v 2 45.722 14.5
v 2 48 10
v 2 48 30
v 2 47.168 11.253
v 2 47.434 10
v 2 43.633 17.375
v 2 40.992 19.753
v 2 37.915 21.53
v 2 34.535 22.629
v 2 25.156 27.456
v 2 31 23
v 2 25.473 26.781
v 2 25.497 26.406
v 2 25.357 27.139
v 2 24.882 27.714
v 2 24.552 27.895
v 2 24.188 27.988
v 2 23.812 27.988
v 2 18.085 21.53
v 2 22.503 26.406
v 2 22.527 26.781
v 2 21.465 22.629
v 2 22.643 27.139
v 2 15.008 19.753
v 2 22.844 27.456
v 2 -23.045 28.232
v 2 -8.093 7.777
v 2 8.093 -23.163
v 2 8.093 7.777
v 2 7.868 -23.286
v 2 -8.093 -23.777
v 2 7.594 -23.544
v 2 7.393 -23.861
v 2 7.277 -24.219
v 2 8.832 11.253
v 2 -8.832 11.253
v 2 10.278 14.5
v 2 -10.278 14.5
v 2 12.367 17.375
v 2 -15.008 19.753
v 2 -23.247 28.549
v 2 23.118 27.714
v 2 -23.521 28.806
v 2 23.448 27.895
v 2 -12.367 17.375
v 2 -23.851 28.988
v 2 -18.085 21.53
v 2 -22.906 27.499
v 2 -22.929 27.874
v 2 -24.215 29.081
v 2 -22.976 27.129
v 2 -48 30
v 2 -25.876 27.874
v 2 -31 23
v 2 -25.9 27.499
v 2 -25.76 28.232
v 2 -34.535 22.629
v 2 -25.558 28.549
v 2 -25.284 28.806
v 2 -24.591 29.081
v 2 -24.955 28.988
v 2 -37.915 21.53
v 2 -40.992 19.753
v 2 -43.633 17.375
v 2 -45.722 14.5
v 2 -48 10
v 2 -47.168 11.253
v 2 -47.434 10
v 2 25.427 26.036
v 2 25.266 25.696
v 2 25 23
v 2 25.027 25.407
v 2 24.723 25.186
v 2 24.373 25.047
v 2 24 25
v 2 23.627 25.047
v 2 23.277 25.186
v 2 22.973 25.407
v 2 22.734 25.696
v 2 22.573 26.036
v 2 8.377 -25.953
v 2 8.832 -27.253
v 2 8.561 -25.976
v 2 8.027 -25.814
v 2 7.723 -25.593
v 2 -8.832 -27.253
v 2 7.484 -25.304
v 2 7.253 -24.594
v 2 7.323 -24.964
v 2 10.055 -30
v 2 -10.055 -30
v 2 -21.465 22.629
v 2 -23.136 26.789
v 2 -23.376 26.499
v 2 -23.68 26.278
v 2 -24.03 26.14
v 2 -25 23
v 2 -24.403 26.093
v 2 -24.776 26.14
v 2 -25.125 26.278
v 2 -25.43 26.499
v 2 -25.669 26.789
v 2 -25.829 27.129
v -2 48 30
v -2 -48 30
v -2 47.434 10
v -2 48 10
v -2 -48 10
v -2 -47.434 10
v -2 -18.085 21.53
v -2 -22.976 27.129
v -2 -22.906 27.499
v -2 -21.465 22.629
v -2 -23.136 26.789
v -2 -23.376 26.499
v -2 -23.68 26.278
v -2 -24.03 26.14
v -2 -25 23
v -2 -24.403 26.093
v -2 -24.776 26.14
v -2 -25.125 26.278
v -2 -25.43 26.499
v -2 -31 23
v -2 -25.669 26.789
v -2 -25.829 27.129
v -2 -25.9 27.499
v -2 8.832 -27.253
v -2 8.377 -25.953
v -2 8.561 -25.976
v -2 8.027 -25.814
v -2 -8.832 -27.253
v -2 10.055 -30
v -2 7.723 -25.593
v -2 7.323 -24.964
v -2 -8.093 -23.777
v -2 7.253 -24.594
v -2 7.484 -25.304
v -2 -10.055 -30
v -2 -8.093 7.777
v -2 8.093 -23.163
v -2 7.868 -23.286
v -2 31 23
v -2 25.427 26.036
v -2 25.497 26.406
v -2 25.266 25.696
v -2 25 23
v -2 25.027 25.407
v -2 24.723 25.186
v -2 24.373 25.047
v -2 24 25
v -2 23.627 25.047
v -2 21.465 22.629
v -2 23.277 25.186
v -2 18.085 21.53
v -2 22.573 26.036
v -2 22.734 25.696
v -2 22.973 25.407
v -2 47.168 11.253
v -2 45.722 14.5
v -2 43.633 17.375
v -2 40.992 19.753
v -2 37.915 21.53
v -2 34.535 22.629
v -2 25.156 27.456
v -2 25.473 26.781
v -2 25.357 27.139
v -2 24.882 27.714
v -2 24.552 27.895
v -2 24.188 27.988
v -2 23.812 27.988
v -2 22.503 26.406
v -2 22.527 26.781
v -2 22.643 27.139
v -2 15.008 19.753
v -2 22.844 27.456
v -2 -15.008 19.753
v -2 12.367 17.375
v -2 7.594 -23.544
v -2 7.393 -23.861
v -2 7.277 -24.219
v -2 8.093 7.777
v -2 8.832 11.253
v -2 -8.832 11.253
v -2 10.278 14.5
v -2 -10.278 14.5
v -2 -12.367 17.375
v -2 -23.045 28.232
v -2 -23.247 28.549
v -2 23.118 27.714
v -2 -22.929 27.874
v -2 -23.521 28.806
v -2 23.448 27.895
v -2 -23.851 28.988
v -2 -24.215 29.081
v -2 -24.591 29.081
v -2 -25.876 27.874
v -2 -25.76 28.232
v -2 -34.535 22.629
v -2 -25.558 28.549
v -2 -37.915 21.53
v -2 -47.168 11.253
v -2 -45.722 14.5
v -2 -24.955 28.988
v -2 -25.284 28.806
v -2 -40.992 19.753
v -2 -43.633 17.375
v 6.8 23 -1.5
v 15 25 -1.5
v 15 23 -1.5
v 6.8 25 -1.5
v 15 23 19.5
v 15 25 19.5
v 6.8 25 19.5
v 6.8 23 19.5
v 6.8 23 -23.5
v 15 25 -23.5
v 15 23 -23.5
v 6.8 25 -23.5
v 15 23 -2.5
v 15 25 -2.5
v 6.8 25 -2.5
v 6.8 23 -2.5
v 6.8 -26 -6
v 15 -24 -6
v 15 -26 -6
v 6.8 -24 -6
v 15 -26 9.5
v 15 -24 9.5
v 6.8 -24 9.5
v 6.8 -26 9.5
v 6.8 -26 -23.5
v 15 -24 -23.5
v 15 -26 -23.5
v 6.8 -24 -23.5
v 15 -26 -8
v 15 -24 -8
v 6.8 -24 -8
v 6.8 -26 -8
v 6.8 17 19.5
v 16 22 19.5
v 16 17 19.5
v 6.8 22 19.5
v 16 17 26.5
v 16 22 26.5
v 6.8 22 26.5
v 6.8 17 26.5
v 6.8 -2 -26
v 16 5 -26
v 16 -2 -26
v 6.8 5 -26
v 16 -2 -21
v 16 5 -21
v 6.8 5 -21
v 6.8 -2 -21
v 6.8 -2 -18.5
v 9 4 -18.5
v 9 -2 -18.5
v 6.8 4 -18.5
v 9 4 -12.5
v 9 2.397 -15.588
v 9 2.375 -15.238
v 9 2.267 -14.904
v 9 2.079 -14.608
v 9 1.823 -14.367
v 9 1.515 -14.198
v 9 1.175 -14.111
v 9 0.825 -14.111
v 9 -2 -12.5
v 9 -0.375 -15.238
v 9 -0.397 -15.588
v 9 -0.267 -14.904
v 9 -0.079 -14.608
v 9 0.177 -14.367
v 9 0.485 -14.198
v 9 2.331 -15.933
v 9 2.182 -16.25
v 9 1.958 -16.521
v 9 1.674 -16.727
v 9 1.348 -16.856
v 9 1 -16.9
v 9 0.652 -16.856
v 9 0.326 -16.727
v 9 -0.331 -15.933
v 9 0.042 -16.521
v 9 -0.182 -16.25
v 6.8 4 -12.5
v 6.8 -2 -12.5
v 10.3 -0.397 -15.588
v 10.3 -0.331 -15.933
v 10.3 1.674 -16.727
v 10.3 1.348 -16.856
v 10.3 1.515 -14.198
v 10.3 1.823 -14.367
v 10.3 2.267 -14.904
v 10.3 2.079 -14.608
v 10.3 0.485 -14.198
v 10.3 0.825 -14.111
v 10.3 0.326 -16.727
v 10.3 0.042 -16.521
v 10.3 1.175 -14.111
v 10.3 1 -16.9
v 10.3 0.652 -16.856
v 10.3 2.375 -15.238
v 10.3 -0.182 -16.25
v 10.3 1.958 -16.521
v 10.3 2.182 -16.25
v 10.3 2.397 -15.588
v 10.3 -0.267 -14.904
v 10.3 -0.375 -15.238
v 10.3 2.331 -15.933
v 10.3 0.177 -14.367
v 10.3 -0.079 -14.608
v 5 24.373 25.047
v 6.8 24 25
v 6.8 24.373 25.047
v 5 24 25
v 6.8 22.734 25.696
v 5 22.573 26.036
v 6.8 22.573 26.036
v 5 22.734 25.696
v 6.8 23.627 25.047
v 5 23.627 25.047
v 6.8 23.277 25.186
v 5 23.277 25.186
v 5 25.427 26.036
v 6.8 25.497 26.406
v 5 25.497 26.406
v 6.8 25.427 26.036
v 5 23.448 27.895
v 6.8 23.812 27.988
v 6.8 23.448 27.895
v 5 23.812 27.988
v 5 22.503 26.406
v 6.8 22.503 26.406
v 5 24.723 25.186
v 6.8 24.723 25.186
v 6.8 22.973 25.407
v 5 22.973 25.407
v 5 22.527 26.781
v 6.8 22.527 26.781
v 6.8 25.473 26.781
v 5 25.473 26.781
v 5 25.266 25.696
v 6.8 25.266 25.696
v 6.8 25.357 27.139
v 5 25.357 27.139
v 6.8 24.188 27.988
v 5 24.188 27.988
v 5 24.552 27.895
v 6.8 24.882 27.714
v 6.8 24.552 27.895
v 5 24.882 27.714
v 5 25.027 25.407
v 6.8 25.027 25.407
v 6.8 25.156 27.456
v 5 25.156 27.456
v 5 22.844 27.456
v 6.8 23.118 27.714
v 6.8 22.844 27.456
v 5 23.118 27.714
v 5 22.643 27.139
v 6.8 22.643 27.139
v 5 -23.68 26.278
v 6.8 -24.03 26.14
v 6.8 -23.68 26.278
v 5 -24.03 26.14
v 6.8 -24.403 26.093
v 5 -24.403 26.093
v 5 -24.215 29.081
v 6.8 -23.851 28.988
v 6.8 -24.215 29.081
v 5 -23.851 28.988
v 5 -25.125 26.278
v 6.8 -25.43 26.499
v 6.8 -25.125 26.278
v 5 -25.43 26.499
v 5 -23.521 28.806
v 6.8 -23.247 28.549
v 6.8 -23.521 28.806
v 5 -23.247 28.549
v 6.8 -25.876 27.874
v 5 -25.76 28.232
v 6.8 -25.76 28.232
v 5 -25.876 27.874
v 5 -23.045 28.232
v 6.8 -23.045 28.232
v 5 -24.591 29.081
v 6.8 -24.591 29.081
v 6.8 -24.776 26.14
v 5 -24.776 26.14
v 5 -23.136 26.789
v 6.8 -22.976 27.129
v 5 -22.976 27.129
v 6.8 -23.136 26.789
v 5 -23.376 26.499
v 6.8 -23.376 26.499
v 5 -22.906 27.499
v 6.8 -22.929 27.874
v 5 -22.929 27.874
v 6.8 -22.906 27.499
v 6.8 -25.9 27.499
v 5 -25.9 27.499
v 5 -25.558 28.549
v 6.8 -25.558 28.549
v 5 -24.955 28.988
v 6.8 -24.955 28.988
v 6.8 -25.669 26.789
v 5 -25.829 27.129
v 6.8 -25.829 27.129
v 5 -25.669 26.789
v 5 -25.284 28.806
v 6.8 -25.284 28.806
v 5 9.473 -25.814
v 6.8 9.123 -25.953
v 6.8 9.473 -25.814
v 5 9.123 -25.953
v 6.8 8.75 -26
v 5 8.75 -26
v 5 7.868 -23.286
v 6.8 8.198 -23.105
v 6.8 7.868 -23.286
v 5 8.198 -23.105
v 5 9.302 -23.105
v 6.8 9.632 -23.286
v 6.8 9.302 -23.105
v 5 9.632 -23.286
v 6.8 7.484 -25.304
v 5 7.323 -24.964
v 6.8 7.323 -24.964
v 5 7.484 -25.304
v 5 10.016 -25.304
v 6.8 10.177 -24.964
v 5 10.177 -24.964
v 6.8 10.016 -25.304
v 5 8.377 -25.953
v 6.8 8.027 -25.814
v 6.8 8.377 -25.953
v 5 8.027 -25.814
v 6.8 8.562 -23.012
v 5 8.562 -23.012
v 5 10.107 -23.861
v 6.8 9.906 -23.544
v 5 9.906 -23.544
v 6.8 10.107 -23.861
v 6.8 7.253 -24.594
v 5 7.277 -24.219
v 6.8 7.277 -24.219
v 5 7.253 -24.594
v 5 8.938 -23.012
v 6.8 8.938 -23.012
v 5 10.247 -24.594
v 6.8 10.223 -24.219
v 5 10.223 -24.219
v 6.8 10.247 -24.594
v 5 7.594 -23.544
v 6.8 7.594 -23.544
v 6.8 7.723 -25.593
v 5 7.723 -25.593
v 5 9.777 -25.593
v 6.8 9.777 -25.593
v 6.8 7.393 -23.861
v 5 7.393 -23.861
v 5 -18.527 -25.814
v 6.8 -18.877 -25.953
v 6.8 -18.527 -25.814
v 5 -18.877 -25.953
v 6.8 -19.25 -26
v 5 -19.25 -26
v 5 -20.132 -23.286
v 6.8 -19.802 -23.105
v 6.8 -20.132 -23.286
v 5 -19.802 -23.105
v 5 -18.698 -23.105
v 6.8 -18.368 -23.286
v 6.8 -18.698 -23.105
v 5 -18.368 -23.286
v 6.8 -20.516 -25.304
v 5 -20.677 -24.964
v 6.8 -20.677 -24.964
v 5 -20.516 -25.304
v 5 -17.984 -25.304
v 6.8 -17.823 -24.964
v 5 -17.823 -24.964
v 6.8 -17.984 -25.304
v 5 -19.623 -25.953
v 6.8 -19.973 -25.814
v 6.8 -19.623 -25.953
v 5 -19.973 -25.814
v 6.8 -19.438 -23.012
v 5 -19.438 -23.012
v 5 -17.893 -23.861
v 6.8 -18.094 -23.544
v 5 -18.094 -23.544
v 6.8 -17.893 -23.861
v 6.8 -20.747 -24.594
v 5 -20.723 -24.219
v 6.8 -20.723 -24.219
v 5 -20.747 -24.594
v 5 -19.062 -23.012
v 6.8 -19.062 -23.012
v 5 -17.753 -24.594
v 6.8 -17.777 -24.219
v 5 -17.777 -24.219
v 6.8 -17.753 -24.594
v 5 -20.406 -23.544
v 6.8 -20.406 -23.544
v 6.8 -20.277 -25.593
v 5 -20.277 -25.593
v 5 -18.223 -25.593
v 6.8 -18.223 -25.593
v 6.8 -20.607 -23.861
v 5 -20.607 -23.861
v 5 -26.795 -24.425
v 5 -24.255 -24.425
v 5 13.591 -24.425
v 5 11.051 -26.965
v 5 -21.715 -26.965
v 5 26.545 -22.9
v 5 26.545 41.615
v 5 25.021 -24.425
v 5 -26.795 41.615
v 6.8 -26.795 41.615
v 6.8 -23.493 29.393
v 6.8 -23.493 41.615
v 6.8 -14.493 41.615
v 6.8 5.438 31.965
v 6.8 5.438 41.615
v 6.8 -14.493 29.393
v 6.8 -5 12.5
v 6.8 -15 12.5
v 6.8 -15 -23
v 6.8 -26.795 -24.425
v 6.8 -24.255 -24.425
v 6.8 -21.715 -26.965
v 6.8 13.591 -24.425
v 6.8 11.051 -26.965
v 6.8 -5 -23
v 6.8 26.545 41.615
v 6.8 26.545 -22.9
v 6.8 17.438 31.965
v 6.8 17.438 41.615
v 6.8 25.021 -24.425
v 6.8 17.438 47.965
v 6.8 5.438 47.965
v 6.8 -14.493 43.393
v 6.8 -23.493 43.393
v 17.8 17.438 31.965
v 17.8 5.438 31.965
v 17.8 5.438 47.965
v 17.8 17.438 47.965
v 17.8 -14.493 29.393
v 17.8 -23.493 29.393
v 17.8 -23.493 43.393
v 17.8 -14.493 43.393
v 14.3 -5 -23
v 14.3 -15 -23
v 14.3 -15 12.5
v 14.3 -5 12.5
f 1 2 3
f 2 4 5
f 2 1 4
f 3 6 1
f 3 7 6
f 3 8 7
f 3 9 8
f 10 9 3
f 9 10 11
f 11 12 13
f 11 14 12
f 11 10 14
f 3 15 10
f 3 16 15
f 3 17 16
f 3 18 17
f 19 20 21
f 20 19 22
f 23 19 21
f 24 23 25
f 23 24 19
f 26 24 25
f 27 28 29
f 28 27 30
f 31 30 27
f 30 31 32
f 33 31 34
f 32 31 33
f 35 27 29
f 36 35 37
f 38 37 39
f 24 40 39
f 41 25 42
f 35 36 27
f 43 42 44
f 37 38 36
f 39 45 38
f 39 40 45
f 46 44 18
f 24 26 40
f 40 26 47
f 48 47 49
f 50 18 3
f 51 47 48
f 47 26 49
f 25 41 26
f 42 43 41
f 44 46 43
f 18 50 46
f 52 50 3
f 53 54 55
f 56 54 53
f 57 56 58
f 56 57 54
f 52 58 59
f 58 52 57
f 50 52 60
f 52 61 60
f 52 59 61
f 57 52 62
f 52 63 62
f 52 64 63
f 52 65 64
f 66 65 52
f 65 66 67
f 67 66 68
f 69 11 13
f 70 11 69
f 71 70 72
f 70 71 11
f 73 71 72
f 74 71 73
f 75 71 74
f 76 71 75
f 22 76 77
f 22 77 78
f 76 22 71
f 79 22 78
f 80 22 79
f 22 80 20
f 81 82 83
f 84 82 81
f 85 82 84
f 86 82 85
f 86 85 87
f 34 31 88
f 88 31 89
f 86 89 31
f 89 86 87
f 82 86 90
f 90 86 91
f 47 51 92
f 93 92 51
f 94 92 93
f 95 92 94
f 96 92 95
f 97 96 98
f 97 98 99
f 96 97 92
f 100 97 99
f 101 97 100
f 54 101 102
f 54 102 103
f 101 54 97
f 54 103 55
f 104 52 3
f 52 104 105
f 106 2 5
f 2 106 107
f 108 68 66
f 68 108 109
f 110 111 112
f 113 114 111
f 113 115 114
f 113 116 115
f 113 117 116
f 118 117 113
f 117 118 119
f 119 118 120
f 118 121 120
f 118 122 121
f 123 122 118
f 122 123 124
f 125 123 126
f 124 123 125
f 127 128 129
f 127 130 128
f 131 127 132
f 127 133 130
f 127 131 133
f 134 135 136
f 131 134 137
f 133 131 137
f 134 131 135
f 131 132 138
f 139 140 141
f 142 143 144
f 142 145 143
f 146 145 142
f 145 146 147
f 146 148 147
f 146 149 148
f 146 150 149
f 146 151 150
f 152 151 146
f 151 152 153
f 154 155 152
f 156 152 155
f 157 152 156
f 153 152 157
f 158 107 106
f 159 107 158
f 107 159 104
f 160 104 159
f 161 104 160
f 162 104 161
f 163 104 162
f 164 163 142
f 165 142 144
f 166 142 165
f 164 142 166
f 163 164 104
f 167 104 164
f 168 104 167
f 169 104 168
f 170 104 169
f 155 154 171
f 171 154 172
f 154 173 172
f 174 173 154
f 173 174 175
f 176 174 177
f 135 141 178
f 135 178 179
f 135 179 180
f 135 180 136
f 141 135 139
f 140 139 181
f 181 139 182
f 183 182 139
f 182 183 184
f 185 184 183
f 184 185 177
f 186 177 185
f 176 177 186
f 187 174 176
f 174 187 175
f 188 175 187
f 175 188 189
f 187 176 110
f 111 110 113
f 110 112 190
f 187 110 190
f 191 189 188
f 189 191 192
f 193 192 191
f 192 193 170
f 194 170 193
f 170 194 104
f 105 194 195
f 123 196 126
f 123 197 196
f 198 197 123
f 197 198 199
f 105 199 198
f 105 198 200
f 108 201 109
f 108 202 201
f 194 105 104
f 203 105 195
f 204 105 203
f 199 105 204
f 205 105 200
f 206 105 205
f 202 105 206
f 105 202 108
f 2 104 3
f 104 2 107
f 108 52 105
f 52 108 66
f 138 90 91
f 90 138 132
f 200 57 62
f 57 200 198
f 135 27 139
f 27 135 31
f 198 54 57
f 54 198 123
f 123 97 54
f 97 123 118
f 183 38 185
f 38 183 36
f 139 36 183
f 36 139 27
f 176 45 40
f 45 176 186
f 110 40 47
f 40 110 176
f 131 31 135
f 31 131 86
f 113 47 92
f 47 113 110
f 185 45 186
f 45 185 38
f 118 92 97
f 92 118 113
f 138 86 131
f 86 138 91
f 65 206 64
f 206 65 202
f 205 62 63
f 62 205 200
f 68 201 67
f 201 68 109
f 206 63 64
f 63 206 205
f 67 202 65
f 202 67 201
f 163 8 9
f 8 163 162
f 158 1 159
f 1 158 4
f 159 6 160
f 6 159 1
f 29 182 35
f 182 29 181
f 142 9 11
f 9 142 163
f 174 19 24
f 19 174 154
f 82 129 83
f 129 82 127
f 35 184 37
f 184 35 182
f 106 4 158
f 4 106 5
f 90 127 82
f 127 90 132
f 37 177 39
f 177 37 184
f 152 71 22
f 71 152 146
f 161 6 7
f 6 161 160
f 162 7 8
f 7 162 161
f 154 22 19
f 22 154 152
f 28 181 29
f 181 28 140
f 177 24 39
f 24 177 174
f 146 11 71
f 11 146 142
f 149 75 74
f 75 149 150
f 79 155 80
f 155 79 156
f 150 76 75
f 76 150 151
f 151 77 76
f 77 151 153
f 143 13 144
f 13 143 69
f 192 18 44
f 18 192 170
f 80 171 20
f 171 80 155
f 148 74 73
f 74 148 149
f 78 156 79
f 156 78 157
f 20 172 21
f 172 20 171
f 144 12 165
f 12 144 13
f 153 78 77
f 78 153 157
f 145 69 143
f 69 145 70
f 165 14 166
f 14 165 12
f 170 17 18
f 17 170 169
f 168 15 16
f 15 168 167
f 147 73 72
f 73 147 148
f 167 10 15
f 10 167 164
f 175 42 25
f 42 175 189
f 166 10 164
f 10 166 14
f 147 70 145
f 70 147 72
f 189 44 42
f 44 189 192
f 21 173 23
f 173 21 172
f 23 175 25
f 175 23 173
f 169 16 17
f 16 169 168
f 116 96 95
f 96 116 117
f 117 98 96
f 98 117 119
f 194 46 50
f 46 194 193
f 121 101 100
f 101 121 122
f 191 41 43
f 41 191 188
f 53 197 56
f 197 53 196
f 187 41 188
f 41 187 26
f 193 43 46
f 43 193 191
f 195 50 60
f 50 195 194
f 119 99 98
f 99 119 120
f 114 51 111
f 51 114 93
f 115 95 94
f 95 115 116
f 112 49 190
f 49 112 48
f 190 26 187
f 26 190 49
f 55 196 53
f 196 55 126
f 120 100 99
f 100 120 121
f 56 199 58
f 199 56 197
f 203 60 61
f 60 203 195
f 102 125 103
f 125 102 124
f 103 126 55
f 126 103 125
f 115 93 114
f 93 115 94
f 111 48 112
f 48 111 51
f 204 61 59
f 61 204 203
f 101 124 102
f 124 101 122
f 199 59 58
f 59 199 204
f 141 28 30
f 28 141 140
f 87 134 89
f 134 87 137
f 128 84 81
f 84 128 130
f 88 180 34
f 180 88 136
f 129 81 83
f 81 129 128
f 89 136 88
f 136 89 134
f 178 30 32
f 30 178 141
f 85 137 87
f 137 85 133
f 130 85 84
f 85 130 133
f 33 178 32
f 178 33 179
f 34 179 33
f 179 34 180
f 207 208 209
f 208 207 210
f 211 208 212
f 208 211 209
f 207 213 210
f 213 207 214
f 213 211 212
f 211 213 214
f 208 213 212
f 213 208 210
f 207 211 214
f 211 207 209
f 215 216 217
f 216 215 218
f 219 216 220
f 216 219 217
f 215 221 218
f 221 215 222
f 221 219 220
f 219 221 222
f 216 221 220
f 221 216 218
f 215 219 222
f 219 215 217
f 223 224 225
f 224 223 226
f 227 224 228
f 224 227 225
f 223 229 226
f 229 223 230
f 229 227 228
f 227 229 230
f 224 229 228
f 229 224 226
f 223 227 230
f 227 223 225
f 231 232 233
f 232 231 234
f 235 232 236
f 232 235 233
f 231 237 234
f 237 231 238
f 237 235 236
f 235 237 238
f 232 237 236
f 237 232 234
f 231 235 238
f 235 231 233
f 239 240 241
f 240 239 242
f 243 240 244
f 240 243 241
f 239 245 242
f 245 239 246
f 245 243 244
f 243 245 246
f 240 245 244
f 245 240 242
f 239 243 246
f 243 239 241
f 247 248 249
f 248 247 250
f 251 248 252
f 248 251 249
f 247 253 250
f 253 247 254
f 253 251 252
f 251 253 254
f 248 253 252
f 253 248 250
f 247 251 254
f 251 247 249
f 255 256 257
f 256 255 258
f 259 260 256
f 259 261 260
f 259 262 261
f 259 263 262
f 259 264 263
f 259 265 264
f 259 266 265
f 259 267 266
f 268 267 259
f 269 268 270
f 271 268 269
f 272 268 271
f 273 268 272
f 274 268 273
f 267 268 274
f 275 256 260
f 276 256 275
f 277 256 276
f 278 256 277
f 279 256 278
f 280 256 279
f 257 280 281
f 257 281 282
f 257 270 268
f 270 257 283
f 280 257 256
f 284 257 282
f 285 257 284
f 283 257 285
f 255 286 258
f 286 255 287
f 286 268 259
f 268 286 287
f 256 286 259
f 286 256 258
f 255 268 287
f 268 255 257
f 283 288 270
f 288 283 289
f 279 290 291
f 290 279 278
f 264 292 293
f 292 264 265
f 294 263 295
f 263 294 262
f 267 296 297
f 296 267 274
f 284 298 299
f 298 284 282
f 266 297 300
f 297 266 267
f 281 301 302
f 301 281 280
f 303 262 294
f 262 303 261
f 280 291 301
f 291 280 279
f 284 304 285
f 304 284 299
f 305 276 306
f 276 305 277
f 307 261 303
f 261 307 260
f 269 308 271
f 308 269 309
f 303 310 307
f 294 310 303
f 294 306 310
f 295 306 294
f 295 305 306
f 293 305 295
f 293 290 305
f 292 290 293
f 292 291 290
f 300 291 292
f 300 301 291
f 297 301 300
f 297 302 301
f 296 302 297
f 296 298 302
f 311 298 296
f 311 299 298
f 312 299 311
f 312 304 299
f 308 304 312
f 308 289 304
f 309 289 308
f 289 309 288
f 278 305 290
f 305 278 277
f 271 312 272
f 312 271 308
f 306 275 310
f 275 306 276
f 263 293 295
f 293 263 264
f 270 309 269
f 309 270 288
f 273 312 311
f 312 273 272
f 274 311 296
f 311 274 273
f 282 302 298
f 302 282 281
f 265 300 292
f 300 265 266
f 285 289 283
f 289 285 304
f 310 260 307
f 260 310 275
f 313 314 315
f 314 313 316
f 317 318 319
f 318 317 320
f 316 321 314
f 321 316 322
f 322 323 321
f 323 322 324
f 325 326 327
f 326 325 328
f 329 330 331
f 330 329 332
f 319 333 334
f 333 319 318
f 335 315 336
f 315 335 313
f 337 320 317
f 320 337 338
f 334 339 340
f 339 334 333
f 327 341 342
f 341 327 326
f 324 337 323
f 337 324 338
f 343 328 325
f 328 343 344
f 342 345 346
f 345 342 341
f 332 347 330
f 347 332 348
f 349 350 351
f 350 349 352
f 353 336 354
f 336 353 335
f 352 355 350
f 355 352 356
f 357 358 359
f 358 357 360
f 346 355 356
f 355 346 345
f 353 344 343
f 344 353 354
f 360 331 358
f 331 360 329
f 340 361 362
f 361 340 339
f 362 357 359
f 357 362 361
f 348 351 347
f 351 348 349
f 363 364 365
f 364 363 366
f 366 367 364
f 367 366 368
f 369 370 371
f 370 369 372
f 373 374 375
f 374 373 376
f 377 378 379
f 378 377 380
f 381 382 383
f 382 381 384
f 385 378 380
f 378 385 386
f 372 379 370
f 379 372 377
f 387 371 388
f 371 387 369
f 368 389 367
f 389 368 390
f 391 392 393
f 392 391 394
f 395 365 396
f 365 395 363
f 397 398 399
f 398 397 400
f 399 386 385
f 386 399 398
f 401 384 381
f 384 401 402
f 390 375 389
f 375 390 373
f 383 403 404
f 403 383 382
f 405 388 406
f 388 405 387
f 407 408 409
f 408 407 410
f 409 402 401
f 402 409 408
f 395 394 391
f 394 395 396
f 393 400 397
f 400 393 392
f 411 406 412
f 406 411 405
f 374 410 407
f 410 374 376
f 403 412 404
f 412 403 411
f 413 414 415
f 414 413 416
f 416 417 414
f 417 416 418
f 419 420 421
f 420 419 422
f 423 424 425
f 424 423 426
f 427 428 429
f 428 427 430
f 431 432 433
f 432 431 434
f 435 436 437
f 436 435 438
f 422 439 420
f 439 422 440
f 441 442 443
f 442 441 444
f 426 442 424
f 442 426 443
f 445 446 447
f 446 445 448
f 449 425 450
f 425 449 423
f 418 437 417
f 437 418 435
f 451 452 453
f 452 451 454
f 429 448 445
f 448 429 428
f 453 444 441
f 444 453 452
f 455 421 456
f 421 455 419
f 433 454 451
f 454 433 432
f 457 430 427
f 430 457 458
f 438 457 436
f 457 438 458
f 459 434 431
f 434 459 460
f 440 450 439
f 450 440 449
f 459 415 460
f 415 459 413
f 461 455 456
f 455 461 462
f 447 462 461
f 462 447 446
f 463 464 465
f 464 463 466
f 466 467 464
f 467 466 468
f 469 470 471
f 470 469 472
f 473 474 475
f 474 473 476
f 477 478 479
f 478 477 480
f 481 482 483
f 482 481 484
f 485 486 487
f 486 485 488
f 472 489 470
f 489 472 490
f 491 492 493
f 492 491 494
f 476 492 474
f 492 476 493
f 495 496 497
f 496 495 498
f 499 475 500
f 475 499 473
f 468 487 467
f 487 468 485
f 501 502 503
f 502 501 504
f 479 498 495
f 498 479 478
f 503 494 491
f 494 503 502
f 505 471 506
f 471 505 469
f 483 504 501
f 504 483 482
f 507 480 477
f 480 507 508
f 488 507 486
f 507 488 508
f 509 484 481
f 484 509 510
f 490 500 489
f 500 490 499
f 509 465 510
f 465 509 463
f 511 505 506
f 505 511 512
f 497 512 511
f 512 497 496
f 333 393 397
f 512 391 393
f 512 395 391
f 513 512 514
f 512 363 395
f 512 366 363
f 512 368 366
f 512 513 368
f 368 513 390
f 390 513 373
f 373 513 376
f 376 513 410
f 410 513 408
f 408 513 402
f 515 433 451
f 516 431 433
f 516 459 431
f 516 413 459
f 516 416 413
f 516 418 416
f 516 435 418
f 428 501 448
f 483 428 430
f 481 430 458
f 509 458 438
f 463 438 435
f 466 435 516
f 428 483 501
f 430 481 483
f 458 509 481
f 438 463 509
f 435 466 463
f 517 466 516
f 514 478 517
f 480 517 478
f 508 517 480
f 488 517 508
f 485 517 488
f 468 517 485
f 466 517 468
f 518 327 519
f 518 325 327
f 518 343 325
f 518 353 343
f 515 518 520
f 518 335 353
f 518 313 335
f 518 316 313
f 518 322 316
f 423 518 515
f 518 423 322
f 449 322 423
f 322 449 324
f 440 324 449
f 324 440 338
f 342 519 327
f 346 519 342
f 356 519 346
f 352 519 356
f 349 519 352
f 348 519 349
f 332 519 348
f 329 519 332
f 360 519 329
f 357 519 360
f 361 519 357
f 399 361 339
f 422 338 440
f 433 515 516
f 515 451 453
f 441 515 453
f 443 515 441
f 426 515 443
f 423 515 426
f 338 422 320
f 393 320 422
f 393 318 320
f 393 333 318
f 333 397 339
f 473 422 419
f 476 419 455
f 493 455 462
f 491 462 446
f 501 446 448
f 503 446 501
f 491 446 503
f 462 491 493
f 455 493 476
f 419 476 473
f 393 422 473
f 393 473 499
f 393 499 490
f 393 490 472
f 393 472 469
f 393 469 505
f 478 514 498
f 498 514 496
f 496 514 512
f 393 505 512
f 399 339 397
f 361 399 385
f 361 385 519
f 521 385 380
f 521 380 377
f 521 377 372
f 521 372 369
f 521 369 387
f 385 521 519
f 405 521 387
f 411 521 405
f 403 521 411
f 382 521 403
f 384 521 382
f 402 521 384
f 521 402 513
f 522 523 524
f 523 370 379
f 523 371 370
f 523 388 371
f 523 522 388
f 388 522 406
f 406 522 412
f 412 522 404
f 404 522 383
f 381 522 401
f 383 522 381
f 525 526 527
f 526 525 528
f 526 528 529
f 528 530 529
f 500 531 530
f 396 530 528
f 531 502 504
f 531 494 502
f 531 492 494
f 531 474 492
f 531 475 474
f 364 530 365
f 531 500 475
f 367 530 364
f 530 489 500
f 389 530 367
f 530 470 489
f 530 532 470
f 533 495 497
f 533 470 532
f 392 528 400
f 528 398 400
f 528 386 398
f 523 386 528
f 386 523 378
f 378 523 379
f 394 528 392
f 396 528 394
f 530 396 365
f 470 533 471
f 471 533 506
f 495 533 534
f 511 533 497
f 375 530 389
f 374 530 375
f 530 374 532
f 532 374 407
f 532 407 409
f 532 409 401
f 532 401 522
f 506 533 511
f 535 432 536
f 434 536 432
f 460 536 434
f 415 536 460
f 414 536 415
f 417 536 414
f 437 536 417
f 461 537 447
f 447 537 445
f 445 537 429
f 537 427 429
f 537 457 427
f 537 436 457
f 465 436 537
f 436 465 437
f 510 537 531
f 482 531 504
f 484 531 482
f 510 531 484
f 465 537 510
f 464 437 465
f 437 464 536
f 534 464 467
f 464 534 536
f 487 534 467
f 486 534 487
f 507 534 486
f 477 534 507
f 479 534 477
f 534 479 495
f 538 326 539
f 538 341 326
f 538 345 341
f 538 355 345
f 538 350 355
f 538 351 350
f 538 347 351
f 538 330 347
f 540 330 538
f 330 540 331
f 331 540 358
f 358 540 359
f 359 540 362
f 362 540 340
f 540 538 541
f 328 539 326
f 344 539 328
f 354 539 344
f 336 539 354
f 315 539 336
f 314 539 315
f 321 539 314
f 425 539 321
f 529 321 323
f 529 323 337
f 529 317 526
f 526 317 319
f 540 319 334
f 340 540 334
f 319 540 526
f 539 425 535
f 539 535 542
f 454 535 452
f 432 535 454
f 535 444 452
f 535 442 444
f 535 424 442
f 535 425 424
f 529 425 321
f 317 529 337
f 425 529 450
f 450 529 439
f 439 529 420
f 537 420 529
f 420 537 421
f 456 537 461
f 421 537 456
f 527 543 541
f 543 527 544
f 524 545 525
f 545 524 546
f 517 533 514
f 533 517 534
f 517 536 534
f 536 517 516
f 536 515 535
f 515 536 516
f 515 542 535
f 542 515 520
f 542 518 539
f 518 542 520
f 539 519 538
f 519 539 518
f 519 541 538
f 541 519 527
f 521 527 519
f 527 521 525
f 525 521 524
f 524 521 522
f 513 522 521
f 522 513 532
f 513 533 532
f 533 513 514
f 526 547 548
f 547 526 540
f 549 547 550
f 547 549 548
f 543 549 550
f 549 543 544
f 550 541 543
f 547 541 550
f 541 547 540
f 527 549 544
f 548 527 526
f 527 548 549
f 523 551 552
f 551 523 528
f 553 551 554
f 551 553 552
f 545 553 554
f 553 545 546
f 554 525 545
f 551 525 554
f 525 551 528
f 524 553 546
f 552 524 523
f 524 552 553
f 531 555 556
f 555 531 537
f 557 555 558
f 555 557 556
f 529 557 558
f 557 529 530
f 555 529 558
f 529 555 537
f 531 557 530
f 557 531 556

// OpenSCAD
// file: roundbox.scad
module roundedRectUp(size, radius)
{
    x = size[0];
    y = size[1];
    z = size[2];

    linear_extrude(height=z)
    hull()
    {
        // place 4 circles in the corners, with the given radius
        translate([(-x/2)+(radius/2), (-y/2)+(radius/2), 0])
        circle(r=radius);

        translate([(x/2)-(radius/2), (-y/2)+(radius/2), 0])
        circle(r=radius);

        translate([(-x/2)+(radius/2), (y/2)-(radius/2), 0])
        circle(r=radius);

        translate([(x/2)-(radius/2), (y/2)-(radius/2), 0])
        circle(r=radius);
    }
}

module roundedRect(size, radius, center=false) 
{
    if( center) {
        translate([ 0, 0, -size[2]/2])
        roundedRectUp(size, radius);
    }
    else {
        roundedRectUp(size, radius);
    }
}


// example
roundedRect([20, 10, 1], 3, true);
// file: arduino.scad
/* arduino.scad
 *
 * Copyright (C) Jestin Stoffel 2012
 *
 * This library is free software; you can redistribute it and/or
 * modify it under the terms of the GNU Library General Public
 * License as published by the Free Software Foundation; either
 * version 2 of the License, or (at your option) any later version.
 *
 * This library is distributed in the hope that it will be useful,
 * but WITHOUT ANY WARRANTY; without even the implied warranty of
 * MERCHANTABILITY or FITNESS FOR A PARTICULAR PURPOSE.  See the GNU
 * Library General Public License for more details.
 *
 * You should have received a copy of the GNU Library General Public
 * License along with this library; if not, write to the Free
 * Software Foundation, Inc., 675 Mass Ave, Cambridge, MA 02139, USA.
 */

// Throughout this entire model, (0,0) is the top left mounting hole (nearest  the USB port)

// thickness of the PCB
board_height = 1.8;

// solid_holes - specifies if mounting holes should be added to or subtracted from the model
// combined_headers - specifies if space should be left between adjacent female headers, or if they should be rendered as a single header
// extend_ports - extends the USB and power ports by a centimeter, so that holes are more easily made when a model is used as a negative
module Arduino(solid_holes, combined_headers, extend_ports)
{
	echo(str("solid_holes: ", solid_holes));
	echo(str("combined_headers: ", combined_headers));
	echo(str("extend_ports: ", extend_ports));

	if (solid_holes == 1)
	{
		echo("solid holes");
		union()
		{
			Board();
			USB(extend_ports);
			PowerPlug(extend_ports);
			FemaleHeaders(combined_headers);
			MaleHeaders();
			ResetButton();
			ATMega();
			MountingHoles();
		}
	}
	else
	{
		echo("regular holes");
		difference()
		{
			union()
			{
				Board();
				USB(extend_ports);
				PowerPlug(extend_ports);
				FemaleHeaders(combined_headers);
				MaleHeaders();
				ResetButton();
				ATMega();
			}
			MountingHoles();
		}
	}
}

module ResetButton()
{
	translate([39, -26, board_height])
	{
		color([0.8, 0.8, 0.8])
		cube([6, 6, 2.2]);
		
		color([0.6, 0.4, 0.2])
		translate([3, 3, 0]) cylinder(r=1.4, h=3.5, $fn=25);
	}
}

module MaleHeaders()
{
	color([0.6, 0.6, 0.6])
	translate([0, 0, board_height])
	{
		translate([0, -7, 0]) cube([7, 5, 9.2]);
		translate([47.5, -26, 0]) cube([5, 7, 9.2]);
	}
}

module ATMega()
{
	color([0.3, 0.3, 0.3])
	translate([14, -39, board_height])
	{
		cube([35.5, 10, 7.5]);
	}
}

module FemaleHeaders(combined)
{
	color([0.3, 0.3, 0.3])
	translate([0, 0, board_height])
	{
		translate([0, -1, 0])
		{
			translate([7, 0, 0])
			{
				if(combined == 1)
				{
					cube([43, 2, 8.2]);
				}
				else
				{
					cube([21, 2, 8.2]);
					translate([22, 0, 0]) cube([21, 2, 8.2]);
				}
			}
		}

		translate([0, -50, 0])
		{
			translate([17, 0, 0])
			{
				if(combined == 1)
				{
					cube([33, 2, 8.2]);
				}
				else
				{
					cube([15.5, 2, 8.2]);
					translate([17.5, 0, 0]) cube([15.5, 2, 8.2]);
				}
			}
		}
	}
}

module PowerPlug(extended)
{
	if(extended == 1)
	{
		translate([-26.893, -47.4929962, board_height])
		color([0.3, 0.3, 0.3])
		cube([24, 9, 11]);
	}
	else
	{
		translate([-16.893, -47.4929962, board_height])
		color([0.3, 0.3, 0.3])
		cube([14, 9, 11]);
	}
}

module USB(extended)
{
	if(extended == 1)
	{
		translate([-31.465, -18.5623962, board_height])
		color([0.8, 0.8, 0.8])
		cube([26, 12, 11]);
	}
	else
	{
		translate([-21.465, -18.5623962, board_height])
		color([0.8, 0.8, 0.8])
		cube([16, 12, 11]);
	}
}


module Board()
{
	color([0, 0.6, 0.8])
	linear_extrude(height = board_height, convexity = 10, twist = 0)
	{
		polygon( points = [ [-15.115, 2.545],
						[49.4, 2.545],
						[50.925, 1.021],
						[50.925, -10.409],
						[53.465, -12.949],
						[53.465, -45.715],
						[50.925, -48.255],
						[50.925, -50.795],
						[-15.115, -50.795] ],
				paths = [[0, 1, 2, 3, 4, 5, 6, 7, 8]],
				convexity = 10);
	}
}

module MountingHoles()
{
	translate([0, 0, -10])
	{
		ArduinoHole(25);
		translate([-1.0929112, -48.4026972, 0]) ArduinoHole(25);
		translate([51, -15.25, 0]) ArduinoHole(25);
		translate([51, -43.25, 0]) ArduinoHole(25);
	}
}

module ArduinoHole(length)
{
	color([0.7, 0.7, 0.7])
	cylinder(r=1.5, h=length, $fn=25);
}

//Arduino( solid_holes=1, combined_headers=0, extend_ports=1);
// file: pont.scad
use <roundbox.scad>

module copy_mirror(vec=[0,1,0])
{
    children();
    mirror(vec) children();
} 

module T() {
difference() 
    {
  union(){
    translate([0, 0, 20])
    cube([4, 96, 20], center=true);
  
    cube([4, 50, 60], center=true);
  }

    copy_mirror()
    color("red")    
    translate([ 0, -28, -8])
    rotate([ 0, 90, 0])
    roundedRect([45, 23,  10], 17, true);
    }
}
 
T();
// main file
use <pont.scad>
include <arduino.scad>

module controller_impl( mat = false, hole=false, equip = false) {
    translate([ 5, 24, 26.5])
    rotate([0, 90, 0])
    
    if( hole) {
        Arduino( solid_holes=1, combined_headers=0, extend_ports=1);    }
    else {
        Arduino( false, false, false);
    }
}

module controller( mat = false, hole=false, equip = false) {
    if( mat) {
        T();
    }
    
    if( hole) {
        controller_impl( hole=true);
    }
    
    if( equip) {
        controller_impl( equip=true);
    }
}


difference() {
controller(mat=true);
controller(hole=true);
}

controller(equip=true);
